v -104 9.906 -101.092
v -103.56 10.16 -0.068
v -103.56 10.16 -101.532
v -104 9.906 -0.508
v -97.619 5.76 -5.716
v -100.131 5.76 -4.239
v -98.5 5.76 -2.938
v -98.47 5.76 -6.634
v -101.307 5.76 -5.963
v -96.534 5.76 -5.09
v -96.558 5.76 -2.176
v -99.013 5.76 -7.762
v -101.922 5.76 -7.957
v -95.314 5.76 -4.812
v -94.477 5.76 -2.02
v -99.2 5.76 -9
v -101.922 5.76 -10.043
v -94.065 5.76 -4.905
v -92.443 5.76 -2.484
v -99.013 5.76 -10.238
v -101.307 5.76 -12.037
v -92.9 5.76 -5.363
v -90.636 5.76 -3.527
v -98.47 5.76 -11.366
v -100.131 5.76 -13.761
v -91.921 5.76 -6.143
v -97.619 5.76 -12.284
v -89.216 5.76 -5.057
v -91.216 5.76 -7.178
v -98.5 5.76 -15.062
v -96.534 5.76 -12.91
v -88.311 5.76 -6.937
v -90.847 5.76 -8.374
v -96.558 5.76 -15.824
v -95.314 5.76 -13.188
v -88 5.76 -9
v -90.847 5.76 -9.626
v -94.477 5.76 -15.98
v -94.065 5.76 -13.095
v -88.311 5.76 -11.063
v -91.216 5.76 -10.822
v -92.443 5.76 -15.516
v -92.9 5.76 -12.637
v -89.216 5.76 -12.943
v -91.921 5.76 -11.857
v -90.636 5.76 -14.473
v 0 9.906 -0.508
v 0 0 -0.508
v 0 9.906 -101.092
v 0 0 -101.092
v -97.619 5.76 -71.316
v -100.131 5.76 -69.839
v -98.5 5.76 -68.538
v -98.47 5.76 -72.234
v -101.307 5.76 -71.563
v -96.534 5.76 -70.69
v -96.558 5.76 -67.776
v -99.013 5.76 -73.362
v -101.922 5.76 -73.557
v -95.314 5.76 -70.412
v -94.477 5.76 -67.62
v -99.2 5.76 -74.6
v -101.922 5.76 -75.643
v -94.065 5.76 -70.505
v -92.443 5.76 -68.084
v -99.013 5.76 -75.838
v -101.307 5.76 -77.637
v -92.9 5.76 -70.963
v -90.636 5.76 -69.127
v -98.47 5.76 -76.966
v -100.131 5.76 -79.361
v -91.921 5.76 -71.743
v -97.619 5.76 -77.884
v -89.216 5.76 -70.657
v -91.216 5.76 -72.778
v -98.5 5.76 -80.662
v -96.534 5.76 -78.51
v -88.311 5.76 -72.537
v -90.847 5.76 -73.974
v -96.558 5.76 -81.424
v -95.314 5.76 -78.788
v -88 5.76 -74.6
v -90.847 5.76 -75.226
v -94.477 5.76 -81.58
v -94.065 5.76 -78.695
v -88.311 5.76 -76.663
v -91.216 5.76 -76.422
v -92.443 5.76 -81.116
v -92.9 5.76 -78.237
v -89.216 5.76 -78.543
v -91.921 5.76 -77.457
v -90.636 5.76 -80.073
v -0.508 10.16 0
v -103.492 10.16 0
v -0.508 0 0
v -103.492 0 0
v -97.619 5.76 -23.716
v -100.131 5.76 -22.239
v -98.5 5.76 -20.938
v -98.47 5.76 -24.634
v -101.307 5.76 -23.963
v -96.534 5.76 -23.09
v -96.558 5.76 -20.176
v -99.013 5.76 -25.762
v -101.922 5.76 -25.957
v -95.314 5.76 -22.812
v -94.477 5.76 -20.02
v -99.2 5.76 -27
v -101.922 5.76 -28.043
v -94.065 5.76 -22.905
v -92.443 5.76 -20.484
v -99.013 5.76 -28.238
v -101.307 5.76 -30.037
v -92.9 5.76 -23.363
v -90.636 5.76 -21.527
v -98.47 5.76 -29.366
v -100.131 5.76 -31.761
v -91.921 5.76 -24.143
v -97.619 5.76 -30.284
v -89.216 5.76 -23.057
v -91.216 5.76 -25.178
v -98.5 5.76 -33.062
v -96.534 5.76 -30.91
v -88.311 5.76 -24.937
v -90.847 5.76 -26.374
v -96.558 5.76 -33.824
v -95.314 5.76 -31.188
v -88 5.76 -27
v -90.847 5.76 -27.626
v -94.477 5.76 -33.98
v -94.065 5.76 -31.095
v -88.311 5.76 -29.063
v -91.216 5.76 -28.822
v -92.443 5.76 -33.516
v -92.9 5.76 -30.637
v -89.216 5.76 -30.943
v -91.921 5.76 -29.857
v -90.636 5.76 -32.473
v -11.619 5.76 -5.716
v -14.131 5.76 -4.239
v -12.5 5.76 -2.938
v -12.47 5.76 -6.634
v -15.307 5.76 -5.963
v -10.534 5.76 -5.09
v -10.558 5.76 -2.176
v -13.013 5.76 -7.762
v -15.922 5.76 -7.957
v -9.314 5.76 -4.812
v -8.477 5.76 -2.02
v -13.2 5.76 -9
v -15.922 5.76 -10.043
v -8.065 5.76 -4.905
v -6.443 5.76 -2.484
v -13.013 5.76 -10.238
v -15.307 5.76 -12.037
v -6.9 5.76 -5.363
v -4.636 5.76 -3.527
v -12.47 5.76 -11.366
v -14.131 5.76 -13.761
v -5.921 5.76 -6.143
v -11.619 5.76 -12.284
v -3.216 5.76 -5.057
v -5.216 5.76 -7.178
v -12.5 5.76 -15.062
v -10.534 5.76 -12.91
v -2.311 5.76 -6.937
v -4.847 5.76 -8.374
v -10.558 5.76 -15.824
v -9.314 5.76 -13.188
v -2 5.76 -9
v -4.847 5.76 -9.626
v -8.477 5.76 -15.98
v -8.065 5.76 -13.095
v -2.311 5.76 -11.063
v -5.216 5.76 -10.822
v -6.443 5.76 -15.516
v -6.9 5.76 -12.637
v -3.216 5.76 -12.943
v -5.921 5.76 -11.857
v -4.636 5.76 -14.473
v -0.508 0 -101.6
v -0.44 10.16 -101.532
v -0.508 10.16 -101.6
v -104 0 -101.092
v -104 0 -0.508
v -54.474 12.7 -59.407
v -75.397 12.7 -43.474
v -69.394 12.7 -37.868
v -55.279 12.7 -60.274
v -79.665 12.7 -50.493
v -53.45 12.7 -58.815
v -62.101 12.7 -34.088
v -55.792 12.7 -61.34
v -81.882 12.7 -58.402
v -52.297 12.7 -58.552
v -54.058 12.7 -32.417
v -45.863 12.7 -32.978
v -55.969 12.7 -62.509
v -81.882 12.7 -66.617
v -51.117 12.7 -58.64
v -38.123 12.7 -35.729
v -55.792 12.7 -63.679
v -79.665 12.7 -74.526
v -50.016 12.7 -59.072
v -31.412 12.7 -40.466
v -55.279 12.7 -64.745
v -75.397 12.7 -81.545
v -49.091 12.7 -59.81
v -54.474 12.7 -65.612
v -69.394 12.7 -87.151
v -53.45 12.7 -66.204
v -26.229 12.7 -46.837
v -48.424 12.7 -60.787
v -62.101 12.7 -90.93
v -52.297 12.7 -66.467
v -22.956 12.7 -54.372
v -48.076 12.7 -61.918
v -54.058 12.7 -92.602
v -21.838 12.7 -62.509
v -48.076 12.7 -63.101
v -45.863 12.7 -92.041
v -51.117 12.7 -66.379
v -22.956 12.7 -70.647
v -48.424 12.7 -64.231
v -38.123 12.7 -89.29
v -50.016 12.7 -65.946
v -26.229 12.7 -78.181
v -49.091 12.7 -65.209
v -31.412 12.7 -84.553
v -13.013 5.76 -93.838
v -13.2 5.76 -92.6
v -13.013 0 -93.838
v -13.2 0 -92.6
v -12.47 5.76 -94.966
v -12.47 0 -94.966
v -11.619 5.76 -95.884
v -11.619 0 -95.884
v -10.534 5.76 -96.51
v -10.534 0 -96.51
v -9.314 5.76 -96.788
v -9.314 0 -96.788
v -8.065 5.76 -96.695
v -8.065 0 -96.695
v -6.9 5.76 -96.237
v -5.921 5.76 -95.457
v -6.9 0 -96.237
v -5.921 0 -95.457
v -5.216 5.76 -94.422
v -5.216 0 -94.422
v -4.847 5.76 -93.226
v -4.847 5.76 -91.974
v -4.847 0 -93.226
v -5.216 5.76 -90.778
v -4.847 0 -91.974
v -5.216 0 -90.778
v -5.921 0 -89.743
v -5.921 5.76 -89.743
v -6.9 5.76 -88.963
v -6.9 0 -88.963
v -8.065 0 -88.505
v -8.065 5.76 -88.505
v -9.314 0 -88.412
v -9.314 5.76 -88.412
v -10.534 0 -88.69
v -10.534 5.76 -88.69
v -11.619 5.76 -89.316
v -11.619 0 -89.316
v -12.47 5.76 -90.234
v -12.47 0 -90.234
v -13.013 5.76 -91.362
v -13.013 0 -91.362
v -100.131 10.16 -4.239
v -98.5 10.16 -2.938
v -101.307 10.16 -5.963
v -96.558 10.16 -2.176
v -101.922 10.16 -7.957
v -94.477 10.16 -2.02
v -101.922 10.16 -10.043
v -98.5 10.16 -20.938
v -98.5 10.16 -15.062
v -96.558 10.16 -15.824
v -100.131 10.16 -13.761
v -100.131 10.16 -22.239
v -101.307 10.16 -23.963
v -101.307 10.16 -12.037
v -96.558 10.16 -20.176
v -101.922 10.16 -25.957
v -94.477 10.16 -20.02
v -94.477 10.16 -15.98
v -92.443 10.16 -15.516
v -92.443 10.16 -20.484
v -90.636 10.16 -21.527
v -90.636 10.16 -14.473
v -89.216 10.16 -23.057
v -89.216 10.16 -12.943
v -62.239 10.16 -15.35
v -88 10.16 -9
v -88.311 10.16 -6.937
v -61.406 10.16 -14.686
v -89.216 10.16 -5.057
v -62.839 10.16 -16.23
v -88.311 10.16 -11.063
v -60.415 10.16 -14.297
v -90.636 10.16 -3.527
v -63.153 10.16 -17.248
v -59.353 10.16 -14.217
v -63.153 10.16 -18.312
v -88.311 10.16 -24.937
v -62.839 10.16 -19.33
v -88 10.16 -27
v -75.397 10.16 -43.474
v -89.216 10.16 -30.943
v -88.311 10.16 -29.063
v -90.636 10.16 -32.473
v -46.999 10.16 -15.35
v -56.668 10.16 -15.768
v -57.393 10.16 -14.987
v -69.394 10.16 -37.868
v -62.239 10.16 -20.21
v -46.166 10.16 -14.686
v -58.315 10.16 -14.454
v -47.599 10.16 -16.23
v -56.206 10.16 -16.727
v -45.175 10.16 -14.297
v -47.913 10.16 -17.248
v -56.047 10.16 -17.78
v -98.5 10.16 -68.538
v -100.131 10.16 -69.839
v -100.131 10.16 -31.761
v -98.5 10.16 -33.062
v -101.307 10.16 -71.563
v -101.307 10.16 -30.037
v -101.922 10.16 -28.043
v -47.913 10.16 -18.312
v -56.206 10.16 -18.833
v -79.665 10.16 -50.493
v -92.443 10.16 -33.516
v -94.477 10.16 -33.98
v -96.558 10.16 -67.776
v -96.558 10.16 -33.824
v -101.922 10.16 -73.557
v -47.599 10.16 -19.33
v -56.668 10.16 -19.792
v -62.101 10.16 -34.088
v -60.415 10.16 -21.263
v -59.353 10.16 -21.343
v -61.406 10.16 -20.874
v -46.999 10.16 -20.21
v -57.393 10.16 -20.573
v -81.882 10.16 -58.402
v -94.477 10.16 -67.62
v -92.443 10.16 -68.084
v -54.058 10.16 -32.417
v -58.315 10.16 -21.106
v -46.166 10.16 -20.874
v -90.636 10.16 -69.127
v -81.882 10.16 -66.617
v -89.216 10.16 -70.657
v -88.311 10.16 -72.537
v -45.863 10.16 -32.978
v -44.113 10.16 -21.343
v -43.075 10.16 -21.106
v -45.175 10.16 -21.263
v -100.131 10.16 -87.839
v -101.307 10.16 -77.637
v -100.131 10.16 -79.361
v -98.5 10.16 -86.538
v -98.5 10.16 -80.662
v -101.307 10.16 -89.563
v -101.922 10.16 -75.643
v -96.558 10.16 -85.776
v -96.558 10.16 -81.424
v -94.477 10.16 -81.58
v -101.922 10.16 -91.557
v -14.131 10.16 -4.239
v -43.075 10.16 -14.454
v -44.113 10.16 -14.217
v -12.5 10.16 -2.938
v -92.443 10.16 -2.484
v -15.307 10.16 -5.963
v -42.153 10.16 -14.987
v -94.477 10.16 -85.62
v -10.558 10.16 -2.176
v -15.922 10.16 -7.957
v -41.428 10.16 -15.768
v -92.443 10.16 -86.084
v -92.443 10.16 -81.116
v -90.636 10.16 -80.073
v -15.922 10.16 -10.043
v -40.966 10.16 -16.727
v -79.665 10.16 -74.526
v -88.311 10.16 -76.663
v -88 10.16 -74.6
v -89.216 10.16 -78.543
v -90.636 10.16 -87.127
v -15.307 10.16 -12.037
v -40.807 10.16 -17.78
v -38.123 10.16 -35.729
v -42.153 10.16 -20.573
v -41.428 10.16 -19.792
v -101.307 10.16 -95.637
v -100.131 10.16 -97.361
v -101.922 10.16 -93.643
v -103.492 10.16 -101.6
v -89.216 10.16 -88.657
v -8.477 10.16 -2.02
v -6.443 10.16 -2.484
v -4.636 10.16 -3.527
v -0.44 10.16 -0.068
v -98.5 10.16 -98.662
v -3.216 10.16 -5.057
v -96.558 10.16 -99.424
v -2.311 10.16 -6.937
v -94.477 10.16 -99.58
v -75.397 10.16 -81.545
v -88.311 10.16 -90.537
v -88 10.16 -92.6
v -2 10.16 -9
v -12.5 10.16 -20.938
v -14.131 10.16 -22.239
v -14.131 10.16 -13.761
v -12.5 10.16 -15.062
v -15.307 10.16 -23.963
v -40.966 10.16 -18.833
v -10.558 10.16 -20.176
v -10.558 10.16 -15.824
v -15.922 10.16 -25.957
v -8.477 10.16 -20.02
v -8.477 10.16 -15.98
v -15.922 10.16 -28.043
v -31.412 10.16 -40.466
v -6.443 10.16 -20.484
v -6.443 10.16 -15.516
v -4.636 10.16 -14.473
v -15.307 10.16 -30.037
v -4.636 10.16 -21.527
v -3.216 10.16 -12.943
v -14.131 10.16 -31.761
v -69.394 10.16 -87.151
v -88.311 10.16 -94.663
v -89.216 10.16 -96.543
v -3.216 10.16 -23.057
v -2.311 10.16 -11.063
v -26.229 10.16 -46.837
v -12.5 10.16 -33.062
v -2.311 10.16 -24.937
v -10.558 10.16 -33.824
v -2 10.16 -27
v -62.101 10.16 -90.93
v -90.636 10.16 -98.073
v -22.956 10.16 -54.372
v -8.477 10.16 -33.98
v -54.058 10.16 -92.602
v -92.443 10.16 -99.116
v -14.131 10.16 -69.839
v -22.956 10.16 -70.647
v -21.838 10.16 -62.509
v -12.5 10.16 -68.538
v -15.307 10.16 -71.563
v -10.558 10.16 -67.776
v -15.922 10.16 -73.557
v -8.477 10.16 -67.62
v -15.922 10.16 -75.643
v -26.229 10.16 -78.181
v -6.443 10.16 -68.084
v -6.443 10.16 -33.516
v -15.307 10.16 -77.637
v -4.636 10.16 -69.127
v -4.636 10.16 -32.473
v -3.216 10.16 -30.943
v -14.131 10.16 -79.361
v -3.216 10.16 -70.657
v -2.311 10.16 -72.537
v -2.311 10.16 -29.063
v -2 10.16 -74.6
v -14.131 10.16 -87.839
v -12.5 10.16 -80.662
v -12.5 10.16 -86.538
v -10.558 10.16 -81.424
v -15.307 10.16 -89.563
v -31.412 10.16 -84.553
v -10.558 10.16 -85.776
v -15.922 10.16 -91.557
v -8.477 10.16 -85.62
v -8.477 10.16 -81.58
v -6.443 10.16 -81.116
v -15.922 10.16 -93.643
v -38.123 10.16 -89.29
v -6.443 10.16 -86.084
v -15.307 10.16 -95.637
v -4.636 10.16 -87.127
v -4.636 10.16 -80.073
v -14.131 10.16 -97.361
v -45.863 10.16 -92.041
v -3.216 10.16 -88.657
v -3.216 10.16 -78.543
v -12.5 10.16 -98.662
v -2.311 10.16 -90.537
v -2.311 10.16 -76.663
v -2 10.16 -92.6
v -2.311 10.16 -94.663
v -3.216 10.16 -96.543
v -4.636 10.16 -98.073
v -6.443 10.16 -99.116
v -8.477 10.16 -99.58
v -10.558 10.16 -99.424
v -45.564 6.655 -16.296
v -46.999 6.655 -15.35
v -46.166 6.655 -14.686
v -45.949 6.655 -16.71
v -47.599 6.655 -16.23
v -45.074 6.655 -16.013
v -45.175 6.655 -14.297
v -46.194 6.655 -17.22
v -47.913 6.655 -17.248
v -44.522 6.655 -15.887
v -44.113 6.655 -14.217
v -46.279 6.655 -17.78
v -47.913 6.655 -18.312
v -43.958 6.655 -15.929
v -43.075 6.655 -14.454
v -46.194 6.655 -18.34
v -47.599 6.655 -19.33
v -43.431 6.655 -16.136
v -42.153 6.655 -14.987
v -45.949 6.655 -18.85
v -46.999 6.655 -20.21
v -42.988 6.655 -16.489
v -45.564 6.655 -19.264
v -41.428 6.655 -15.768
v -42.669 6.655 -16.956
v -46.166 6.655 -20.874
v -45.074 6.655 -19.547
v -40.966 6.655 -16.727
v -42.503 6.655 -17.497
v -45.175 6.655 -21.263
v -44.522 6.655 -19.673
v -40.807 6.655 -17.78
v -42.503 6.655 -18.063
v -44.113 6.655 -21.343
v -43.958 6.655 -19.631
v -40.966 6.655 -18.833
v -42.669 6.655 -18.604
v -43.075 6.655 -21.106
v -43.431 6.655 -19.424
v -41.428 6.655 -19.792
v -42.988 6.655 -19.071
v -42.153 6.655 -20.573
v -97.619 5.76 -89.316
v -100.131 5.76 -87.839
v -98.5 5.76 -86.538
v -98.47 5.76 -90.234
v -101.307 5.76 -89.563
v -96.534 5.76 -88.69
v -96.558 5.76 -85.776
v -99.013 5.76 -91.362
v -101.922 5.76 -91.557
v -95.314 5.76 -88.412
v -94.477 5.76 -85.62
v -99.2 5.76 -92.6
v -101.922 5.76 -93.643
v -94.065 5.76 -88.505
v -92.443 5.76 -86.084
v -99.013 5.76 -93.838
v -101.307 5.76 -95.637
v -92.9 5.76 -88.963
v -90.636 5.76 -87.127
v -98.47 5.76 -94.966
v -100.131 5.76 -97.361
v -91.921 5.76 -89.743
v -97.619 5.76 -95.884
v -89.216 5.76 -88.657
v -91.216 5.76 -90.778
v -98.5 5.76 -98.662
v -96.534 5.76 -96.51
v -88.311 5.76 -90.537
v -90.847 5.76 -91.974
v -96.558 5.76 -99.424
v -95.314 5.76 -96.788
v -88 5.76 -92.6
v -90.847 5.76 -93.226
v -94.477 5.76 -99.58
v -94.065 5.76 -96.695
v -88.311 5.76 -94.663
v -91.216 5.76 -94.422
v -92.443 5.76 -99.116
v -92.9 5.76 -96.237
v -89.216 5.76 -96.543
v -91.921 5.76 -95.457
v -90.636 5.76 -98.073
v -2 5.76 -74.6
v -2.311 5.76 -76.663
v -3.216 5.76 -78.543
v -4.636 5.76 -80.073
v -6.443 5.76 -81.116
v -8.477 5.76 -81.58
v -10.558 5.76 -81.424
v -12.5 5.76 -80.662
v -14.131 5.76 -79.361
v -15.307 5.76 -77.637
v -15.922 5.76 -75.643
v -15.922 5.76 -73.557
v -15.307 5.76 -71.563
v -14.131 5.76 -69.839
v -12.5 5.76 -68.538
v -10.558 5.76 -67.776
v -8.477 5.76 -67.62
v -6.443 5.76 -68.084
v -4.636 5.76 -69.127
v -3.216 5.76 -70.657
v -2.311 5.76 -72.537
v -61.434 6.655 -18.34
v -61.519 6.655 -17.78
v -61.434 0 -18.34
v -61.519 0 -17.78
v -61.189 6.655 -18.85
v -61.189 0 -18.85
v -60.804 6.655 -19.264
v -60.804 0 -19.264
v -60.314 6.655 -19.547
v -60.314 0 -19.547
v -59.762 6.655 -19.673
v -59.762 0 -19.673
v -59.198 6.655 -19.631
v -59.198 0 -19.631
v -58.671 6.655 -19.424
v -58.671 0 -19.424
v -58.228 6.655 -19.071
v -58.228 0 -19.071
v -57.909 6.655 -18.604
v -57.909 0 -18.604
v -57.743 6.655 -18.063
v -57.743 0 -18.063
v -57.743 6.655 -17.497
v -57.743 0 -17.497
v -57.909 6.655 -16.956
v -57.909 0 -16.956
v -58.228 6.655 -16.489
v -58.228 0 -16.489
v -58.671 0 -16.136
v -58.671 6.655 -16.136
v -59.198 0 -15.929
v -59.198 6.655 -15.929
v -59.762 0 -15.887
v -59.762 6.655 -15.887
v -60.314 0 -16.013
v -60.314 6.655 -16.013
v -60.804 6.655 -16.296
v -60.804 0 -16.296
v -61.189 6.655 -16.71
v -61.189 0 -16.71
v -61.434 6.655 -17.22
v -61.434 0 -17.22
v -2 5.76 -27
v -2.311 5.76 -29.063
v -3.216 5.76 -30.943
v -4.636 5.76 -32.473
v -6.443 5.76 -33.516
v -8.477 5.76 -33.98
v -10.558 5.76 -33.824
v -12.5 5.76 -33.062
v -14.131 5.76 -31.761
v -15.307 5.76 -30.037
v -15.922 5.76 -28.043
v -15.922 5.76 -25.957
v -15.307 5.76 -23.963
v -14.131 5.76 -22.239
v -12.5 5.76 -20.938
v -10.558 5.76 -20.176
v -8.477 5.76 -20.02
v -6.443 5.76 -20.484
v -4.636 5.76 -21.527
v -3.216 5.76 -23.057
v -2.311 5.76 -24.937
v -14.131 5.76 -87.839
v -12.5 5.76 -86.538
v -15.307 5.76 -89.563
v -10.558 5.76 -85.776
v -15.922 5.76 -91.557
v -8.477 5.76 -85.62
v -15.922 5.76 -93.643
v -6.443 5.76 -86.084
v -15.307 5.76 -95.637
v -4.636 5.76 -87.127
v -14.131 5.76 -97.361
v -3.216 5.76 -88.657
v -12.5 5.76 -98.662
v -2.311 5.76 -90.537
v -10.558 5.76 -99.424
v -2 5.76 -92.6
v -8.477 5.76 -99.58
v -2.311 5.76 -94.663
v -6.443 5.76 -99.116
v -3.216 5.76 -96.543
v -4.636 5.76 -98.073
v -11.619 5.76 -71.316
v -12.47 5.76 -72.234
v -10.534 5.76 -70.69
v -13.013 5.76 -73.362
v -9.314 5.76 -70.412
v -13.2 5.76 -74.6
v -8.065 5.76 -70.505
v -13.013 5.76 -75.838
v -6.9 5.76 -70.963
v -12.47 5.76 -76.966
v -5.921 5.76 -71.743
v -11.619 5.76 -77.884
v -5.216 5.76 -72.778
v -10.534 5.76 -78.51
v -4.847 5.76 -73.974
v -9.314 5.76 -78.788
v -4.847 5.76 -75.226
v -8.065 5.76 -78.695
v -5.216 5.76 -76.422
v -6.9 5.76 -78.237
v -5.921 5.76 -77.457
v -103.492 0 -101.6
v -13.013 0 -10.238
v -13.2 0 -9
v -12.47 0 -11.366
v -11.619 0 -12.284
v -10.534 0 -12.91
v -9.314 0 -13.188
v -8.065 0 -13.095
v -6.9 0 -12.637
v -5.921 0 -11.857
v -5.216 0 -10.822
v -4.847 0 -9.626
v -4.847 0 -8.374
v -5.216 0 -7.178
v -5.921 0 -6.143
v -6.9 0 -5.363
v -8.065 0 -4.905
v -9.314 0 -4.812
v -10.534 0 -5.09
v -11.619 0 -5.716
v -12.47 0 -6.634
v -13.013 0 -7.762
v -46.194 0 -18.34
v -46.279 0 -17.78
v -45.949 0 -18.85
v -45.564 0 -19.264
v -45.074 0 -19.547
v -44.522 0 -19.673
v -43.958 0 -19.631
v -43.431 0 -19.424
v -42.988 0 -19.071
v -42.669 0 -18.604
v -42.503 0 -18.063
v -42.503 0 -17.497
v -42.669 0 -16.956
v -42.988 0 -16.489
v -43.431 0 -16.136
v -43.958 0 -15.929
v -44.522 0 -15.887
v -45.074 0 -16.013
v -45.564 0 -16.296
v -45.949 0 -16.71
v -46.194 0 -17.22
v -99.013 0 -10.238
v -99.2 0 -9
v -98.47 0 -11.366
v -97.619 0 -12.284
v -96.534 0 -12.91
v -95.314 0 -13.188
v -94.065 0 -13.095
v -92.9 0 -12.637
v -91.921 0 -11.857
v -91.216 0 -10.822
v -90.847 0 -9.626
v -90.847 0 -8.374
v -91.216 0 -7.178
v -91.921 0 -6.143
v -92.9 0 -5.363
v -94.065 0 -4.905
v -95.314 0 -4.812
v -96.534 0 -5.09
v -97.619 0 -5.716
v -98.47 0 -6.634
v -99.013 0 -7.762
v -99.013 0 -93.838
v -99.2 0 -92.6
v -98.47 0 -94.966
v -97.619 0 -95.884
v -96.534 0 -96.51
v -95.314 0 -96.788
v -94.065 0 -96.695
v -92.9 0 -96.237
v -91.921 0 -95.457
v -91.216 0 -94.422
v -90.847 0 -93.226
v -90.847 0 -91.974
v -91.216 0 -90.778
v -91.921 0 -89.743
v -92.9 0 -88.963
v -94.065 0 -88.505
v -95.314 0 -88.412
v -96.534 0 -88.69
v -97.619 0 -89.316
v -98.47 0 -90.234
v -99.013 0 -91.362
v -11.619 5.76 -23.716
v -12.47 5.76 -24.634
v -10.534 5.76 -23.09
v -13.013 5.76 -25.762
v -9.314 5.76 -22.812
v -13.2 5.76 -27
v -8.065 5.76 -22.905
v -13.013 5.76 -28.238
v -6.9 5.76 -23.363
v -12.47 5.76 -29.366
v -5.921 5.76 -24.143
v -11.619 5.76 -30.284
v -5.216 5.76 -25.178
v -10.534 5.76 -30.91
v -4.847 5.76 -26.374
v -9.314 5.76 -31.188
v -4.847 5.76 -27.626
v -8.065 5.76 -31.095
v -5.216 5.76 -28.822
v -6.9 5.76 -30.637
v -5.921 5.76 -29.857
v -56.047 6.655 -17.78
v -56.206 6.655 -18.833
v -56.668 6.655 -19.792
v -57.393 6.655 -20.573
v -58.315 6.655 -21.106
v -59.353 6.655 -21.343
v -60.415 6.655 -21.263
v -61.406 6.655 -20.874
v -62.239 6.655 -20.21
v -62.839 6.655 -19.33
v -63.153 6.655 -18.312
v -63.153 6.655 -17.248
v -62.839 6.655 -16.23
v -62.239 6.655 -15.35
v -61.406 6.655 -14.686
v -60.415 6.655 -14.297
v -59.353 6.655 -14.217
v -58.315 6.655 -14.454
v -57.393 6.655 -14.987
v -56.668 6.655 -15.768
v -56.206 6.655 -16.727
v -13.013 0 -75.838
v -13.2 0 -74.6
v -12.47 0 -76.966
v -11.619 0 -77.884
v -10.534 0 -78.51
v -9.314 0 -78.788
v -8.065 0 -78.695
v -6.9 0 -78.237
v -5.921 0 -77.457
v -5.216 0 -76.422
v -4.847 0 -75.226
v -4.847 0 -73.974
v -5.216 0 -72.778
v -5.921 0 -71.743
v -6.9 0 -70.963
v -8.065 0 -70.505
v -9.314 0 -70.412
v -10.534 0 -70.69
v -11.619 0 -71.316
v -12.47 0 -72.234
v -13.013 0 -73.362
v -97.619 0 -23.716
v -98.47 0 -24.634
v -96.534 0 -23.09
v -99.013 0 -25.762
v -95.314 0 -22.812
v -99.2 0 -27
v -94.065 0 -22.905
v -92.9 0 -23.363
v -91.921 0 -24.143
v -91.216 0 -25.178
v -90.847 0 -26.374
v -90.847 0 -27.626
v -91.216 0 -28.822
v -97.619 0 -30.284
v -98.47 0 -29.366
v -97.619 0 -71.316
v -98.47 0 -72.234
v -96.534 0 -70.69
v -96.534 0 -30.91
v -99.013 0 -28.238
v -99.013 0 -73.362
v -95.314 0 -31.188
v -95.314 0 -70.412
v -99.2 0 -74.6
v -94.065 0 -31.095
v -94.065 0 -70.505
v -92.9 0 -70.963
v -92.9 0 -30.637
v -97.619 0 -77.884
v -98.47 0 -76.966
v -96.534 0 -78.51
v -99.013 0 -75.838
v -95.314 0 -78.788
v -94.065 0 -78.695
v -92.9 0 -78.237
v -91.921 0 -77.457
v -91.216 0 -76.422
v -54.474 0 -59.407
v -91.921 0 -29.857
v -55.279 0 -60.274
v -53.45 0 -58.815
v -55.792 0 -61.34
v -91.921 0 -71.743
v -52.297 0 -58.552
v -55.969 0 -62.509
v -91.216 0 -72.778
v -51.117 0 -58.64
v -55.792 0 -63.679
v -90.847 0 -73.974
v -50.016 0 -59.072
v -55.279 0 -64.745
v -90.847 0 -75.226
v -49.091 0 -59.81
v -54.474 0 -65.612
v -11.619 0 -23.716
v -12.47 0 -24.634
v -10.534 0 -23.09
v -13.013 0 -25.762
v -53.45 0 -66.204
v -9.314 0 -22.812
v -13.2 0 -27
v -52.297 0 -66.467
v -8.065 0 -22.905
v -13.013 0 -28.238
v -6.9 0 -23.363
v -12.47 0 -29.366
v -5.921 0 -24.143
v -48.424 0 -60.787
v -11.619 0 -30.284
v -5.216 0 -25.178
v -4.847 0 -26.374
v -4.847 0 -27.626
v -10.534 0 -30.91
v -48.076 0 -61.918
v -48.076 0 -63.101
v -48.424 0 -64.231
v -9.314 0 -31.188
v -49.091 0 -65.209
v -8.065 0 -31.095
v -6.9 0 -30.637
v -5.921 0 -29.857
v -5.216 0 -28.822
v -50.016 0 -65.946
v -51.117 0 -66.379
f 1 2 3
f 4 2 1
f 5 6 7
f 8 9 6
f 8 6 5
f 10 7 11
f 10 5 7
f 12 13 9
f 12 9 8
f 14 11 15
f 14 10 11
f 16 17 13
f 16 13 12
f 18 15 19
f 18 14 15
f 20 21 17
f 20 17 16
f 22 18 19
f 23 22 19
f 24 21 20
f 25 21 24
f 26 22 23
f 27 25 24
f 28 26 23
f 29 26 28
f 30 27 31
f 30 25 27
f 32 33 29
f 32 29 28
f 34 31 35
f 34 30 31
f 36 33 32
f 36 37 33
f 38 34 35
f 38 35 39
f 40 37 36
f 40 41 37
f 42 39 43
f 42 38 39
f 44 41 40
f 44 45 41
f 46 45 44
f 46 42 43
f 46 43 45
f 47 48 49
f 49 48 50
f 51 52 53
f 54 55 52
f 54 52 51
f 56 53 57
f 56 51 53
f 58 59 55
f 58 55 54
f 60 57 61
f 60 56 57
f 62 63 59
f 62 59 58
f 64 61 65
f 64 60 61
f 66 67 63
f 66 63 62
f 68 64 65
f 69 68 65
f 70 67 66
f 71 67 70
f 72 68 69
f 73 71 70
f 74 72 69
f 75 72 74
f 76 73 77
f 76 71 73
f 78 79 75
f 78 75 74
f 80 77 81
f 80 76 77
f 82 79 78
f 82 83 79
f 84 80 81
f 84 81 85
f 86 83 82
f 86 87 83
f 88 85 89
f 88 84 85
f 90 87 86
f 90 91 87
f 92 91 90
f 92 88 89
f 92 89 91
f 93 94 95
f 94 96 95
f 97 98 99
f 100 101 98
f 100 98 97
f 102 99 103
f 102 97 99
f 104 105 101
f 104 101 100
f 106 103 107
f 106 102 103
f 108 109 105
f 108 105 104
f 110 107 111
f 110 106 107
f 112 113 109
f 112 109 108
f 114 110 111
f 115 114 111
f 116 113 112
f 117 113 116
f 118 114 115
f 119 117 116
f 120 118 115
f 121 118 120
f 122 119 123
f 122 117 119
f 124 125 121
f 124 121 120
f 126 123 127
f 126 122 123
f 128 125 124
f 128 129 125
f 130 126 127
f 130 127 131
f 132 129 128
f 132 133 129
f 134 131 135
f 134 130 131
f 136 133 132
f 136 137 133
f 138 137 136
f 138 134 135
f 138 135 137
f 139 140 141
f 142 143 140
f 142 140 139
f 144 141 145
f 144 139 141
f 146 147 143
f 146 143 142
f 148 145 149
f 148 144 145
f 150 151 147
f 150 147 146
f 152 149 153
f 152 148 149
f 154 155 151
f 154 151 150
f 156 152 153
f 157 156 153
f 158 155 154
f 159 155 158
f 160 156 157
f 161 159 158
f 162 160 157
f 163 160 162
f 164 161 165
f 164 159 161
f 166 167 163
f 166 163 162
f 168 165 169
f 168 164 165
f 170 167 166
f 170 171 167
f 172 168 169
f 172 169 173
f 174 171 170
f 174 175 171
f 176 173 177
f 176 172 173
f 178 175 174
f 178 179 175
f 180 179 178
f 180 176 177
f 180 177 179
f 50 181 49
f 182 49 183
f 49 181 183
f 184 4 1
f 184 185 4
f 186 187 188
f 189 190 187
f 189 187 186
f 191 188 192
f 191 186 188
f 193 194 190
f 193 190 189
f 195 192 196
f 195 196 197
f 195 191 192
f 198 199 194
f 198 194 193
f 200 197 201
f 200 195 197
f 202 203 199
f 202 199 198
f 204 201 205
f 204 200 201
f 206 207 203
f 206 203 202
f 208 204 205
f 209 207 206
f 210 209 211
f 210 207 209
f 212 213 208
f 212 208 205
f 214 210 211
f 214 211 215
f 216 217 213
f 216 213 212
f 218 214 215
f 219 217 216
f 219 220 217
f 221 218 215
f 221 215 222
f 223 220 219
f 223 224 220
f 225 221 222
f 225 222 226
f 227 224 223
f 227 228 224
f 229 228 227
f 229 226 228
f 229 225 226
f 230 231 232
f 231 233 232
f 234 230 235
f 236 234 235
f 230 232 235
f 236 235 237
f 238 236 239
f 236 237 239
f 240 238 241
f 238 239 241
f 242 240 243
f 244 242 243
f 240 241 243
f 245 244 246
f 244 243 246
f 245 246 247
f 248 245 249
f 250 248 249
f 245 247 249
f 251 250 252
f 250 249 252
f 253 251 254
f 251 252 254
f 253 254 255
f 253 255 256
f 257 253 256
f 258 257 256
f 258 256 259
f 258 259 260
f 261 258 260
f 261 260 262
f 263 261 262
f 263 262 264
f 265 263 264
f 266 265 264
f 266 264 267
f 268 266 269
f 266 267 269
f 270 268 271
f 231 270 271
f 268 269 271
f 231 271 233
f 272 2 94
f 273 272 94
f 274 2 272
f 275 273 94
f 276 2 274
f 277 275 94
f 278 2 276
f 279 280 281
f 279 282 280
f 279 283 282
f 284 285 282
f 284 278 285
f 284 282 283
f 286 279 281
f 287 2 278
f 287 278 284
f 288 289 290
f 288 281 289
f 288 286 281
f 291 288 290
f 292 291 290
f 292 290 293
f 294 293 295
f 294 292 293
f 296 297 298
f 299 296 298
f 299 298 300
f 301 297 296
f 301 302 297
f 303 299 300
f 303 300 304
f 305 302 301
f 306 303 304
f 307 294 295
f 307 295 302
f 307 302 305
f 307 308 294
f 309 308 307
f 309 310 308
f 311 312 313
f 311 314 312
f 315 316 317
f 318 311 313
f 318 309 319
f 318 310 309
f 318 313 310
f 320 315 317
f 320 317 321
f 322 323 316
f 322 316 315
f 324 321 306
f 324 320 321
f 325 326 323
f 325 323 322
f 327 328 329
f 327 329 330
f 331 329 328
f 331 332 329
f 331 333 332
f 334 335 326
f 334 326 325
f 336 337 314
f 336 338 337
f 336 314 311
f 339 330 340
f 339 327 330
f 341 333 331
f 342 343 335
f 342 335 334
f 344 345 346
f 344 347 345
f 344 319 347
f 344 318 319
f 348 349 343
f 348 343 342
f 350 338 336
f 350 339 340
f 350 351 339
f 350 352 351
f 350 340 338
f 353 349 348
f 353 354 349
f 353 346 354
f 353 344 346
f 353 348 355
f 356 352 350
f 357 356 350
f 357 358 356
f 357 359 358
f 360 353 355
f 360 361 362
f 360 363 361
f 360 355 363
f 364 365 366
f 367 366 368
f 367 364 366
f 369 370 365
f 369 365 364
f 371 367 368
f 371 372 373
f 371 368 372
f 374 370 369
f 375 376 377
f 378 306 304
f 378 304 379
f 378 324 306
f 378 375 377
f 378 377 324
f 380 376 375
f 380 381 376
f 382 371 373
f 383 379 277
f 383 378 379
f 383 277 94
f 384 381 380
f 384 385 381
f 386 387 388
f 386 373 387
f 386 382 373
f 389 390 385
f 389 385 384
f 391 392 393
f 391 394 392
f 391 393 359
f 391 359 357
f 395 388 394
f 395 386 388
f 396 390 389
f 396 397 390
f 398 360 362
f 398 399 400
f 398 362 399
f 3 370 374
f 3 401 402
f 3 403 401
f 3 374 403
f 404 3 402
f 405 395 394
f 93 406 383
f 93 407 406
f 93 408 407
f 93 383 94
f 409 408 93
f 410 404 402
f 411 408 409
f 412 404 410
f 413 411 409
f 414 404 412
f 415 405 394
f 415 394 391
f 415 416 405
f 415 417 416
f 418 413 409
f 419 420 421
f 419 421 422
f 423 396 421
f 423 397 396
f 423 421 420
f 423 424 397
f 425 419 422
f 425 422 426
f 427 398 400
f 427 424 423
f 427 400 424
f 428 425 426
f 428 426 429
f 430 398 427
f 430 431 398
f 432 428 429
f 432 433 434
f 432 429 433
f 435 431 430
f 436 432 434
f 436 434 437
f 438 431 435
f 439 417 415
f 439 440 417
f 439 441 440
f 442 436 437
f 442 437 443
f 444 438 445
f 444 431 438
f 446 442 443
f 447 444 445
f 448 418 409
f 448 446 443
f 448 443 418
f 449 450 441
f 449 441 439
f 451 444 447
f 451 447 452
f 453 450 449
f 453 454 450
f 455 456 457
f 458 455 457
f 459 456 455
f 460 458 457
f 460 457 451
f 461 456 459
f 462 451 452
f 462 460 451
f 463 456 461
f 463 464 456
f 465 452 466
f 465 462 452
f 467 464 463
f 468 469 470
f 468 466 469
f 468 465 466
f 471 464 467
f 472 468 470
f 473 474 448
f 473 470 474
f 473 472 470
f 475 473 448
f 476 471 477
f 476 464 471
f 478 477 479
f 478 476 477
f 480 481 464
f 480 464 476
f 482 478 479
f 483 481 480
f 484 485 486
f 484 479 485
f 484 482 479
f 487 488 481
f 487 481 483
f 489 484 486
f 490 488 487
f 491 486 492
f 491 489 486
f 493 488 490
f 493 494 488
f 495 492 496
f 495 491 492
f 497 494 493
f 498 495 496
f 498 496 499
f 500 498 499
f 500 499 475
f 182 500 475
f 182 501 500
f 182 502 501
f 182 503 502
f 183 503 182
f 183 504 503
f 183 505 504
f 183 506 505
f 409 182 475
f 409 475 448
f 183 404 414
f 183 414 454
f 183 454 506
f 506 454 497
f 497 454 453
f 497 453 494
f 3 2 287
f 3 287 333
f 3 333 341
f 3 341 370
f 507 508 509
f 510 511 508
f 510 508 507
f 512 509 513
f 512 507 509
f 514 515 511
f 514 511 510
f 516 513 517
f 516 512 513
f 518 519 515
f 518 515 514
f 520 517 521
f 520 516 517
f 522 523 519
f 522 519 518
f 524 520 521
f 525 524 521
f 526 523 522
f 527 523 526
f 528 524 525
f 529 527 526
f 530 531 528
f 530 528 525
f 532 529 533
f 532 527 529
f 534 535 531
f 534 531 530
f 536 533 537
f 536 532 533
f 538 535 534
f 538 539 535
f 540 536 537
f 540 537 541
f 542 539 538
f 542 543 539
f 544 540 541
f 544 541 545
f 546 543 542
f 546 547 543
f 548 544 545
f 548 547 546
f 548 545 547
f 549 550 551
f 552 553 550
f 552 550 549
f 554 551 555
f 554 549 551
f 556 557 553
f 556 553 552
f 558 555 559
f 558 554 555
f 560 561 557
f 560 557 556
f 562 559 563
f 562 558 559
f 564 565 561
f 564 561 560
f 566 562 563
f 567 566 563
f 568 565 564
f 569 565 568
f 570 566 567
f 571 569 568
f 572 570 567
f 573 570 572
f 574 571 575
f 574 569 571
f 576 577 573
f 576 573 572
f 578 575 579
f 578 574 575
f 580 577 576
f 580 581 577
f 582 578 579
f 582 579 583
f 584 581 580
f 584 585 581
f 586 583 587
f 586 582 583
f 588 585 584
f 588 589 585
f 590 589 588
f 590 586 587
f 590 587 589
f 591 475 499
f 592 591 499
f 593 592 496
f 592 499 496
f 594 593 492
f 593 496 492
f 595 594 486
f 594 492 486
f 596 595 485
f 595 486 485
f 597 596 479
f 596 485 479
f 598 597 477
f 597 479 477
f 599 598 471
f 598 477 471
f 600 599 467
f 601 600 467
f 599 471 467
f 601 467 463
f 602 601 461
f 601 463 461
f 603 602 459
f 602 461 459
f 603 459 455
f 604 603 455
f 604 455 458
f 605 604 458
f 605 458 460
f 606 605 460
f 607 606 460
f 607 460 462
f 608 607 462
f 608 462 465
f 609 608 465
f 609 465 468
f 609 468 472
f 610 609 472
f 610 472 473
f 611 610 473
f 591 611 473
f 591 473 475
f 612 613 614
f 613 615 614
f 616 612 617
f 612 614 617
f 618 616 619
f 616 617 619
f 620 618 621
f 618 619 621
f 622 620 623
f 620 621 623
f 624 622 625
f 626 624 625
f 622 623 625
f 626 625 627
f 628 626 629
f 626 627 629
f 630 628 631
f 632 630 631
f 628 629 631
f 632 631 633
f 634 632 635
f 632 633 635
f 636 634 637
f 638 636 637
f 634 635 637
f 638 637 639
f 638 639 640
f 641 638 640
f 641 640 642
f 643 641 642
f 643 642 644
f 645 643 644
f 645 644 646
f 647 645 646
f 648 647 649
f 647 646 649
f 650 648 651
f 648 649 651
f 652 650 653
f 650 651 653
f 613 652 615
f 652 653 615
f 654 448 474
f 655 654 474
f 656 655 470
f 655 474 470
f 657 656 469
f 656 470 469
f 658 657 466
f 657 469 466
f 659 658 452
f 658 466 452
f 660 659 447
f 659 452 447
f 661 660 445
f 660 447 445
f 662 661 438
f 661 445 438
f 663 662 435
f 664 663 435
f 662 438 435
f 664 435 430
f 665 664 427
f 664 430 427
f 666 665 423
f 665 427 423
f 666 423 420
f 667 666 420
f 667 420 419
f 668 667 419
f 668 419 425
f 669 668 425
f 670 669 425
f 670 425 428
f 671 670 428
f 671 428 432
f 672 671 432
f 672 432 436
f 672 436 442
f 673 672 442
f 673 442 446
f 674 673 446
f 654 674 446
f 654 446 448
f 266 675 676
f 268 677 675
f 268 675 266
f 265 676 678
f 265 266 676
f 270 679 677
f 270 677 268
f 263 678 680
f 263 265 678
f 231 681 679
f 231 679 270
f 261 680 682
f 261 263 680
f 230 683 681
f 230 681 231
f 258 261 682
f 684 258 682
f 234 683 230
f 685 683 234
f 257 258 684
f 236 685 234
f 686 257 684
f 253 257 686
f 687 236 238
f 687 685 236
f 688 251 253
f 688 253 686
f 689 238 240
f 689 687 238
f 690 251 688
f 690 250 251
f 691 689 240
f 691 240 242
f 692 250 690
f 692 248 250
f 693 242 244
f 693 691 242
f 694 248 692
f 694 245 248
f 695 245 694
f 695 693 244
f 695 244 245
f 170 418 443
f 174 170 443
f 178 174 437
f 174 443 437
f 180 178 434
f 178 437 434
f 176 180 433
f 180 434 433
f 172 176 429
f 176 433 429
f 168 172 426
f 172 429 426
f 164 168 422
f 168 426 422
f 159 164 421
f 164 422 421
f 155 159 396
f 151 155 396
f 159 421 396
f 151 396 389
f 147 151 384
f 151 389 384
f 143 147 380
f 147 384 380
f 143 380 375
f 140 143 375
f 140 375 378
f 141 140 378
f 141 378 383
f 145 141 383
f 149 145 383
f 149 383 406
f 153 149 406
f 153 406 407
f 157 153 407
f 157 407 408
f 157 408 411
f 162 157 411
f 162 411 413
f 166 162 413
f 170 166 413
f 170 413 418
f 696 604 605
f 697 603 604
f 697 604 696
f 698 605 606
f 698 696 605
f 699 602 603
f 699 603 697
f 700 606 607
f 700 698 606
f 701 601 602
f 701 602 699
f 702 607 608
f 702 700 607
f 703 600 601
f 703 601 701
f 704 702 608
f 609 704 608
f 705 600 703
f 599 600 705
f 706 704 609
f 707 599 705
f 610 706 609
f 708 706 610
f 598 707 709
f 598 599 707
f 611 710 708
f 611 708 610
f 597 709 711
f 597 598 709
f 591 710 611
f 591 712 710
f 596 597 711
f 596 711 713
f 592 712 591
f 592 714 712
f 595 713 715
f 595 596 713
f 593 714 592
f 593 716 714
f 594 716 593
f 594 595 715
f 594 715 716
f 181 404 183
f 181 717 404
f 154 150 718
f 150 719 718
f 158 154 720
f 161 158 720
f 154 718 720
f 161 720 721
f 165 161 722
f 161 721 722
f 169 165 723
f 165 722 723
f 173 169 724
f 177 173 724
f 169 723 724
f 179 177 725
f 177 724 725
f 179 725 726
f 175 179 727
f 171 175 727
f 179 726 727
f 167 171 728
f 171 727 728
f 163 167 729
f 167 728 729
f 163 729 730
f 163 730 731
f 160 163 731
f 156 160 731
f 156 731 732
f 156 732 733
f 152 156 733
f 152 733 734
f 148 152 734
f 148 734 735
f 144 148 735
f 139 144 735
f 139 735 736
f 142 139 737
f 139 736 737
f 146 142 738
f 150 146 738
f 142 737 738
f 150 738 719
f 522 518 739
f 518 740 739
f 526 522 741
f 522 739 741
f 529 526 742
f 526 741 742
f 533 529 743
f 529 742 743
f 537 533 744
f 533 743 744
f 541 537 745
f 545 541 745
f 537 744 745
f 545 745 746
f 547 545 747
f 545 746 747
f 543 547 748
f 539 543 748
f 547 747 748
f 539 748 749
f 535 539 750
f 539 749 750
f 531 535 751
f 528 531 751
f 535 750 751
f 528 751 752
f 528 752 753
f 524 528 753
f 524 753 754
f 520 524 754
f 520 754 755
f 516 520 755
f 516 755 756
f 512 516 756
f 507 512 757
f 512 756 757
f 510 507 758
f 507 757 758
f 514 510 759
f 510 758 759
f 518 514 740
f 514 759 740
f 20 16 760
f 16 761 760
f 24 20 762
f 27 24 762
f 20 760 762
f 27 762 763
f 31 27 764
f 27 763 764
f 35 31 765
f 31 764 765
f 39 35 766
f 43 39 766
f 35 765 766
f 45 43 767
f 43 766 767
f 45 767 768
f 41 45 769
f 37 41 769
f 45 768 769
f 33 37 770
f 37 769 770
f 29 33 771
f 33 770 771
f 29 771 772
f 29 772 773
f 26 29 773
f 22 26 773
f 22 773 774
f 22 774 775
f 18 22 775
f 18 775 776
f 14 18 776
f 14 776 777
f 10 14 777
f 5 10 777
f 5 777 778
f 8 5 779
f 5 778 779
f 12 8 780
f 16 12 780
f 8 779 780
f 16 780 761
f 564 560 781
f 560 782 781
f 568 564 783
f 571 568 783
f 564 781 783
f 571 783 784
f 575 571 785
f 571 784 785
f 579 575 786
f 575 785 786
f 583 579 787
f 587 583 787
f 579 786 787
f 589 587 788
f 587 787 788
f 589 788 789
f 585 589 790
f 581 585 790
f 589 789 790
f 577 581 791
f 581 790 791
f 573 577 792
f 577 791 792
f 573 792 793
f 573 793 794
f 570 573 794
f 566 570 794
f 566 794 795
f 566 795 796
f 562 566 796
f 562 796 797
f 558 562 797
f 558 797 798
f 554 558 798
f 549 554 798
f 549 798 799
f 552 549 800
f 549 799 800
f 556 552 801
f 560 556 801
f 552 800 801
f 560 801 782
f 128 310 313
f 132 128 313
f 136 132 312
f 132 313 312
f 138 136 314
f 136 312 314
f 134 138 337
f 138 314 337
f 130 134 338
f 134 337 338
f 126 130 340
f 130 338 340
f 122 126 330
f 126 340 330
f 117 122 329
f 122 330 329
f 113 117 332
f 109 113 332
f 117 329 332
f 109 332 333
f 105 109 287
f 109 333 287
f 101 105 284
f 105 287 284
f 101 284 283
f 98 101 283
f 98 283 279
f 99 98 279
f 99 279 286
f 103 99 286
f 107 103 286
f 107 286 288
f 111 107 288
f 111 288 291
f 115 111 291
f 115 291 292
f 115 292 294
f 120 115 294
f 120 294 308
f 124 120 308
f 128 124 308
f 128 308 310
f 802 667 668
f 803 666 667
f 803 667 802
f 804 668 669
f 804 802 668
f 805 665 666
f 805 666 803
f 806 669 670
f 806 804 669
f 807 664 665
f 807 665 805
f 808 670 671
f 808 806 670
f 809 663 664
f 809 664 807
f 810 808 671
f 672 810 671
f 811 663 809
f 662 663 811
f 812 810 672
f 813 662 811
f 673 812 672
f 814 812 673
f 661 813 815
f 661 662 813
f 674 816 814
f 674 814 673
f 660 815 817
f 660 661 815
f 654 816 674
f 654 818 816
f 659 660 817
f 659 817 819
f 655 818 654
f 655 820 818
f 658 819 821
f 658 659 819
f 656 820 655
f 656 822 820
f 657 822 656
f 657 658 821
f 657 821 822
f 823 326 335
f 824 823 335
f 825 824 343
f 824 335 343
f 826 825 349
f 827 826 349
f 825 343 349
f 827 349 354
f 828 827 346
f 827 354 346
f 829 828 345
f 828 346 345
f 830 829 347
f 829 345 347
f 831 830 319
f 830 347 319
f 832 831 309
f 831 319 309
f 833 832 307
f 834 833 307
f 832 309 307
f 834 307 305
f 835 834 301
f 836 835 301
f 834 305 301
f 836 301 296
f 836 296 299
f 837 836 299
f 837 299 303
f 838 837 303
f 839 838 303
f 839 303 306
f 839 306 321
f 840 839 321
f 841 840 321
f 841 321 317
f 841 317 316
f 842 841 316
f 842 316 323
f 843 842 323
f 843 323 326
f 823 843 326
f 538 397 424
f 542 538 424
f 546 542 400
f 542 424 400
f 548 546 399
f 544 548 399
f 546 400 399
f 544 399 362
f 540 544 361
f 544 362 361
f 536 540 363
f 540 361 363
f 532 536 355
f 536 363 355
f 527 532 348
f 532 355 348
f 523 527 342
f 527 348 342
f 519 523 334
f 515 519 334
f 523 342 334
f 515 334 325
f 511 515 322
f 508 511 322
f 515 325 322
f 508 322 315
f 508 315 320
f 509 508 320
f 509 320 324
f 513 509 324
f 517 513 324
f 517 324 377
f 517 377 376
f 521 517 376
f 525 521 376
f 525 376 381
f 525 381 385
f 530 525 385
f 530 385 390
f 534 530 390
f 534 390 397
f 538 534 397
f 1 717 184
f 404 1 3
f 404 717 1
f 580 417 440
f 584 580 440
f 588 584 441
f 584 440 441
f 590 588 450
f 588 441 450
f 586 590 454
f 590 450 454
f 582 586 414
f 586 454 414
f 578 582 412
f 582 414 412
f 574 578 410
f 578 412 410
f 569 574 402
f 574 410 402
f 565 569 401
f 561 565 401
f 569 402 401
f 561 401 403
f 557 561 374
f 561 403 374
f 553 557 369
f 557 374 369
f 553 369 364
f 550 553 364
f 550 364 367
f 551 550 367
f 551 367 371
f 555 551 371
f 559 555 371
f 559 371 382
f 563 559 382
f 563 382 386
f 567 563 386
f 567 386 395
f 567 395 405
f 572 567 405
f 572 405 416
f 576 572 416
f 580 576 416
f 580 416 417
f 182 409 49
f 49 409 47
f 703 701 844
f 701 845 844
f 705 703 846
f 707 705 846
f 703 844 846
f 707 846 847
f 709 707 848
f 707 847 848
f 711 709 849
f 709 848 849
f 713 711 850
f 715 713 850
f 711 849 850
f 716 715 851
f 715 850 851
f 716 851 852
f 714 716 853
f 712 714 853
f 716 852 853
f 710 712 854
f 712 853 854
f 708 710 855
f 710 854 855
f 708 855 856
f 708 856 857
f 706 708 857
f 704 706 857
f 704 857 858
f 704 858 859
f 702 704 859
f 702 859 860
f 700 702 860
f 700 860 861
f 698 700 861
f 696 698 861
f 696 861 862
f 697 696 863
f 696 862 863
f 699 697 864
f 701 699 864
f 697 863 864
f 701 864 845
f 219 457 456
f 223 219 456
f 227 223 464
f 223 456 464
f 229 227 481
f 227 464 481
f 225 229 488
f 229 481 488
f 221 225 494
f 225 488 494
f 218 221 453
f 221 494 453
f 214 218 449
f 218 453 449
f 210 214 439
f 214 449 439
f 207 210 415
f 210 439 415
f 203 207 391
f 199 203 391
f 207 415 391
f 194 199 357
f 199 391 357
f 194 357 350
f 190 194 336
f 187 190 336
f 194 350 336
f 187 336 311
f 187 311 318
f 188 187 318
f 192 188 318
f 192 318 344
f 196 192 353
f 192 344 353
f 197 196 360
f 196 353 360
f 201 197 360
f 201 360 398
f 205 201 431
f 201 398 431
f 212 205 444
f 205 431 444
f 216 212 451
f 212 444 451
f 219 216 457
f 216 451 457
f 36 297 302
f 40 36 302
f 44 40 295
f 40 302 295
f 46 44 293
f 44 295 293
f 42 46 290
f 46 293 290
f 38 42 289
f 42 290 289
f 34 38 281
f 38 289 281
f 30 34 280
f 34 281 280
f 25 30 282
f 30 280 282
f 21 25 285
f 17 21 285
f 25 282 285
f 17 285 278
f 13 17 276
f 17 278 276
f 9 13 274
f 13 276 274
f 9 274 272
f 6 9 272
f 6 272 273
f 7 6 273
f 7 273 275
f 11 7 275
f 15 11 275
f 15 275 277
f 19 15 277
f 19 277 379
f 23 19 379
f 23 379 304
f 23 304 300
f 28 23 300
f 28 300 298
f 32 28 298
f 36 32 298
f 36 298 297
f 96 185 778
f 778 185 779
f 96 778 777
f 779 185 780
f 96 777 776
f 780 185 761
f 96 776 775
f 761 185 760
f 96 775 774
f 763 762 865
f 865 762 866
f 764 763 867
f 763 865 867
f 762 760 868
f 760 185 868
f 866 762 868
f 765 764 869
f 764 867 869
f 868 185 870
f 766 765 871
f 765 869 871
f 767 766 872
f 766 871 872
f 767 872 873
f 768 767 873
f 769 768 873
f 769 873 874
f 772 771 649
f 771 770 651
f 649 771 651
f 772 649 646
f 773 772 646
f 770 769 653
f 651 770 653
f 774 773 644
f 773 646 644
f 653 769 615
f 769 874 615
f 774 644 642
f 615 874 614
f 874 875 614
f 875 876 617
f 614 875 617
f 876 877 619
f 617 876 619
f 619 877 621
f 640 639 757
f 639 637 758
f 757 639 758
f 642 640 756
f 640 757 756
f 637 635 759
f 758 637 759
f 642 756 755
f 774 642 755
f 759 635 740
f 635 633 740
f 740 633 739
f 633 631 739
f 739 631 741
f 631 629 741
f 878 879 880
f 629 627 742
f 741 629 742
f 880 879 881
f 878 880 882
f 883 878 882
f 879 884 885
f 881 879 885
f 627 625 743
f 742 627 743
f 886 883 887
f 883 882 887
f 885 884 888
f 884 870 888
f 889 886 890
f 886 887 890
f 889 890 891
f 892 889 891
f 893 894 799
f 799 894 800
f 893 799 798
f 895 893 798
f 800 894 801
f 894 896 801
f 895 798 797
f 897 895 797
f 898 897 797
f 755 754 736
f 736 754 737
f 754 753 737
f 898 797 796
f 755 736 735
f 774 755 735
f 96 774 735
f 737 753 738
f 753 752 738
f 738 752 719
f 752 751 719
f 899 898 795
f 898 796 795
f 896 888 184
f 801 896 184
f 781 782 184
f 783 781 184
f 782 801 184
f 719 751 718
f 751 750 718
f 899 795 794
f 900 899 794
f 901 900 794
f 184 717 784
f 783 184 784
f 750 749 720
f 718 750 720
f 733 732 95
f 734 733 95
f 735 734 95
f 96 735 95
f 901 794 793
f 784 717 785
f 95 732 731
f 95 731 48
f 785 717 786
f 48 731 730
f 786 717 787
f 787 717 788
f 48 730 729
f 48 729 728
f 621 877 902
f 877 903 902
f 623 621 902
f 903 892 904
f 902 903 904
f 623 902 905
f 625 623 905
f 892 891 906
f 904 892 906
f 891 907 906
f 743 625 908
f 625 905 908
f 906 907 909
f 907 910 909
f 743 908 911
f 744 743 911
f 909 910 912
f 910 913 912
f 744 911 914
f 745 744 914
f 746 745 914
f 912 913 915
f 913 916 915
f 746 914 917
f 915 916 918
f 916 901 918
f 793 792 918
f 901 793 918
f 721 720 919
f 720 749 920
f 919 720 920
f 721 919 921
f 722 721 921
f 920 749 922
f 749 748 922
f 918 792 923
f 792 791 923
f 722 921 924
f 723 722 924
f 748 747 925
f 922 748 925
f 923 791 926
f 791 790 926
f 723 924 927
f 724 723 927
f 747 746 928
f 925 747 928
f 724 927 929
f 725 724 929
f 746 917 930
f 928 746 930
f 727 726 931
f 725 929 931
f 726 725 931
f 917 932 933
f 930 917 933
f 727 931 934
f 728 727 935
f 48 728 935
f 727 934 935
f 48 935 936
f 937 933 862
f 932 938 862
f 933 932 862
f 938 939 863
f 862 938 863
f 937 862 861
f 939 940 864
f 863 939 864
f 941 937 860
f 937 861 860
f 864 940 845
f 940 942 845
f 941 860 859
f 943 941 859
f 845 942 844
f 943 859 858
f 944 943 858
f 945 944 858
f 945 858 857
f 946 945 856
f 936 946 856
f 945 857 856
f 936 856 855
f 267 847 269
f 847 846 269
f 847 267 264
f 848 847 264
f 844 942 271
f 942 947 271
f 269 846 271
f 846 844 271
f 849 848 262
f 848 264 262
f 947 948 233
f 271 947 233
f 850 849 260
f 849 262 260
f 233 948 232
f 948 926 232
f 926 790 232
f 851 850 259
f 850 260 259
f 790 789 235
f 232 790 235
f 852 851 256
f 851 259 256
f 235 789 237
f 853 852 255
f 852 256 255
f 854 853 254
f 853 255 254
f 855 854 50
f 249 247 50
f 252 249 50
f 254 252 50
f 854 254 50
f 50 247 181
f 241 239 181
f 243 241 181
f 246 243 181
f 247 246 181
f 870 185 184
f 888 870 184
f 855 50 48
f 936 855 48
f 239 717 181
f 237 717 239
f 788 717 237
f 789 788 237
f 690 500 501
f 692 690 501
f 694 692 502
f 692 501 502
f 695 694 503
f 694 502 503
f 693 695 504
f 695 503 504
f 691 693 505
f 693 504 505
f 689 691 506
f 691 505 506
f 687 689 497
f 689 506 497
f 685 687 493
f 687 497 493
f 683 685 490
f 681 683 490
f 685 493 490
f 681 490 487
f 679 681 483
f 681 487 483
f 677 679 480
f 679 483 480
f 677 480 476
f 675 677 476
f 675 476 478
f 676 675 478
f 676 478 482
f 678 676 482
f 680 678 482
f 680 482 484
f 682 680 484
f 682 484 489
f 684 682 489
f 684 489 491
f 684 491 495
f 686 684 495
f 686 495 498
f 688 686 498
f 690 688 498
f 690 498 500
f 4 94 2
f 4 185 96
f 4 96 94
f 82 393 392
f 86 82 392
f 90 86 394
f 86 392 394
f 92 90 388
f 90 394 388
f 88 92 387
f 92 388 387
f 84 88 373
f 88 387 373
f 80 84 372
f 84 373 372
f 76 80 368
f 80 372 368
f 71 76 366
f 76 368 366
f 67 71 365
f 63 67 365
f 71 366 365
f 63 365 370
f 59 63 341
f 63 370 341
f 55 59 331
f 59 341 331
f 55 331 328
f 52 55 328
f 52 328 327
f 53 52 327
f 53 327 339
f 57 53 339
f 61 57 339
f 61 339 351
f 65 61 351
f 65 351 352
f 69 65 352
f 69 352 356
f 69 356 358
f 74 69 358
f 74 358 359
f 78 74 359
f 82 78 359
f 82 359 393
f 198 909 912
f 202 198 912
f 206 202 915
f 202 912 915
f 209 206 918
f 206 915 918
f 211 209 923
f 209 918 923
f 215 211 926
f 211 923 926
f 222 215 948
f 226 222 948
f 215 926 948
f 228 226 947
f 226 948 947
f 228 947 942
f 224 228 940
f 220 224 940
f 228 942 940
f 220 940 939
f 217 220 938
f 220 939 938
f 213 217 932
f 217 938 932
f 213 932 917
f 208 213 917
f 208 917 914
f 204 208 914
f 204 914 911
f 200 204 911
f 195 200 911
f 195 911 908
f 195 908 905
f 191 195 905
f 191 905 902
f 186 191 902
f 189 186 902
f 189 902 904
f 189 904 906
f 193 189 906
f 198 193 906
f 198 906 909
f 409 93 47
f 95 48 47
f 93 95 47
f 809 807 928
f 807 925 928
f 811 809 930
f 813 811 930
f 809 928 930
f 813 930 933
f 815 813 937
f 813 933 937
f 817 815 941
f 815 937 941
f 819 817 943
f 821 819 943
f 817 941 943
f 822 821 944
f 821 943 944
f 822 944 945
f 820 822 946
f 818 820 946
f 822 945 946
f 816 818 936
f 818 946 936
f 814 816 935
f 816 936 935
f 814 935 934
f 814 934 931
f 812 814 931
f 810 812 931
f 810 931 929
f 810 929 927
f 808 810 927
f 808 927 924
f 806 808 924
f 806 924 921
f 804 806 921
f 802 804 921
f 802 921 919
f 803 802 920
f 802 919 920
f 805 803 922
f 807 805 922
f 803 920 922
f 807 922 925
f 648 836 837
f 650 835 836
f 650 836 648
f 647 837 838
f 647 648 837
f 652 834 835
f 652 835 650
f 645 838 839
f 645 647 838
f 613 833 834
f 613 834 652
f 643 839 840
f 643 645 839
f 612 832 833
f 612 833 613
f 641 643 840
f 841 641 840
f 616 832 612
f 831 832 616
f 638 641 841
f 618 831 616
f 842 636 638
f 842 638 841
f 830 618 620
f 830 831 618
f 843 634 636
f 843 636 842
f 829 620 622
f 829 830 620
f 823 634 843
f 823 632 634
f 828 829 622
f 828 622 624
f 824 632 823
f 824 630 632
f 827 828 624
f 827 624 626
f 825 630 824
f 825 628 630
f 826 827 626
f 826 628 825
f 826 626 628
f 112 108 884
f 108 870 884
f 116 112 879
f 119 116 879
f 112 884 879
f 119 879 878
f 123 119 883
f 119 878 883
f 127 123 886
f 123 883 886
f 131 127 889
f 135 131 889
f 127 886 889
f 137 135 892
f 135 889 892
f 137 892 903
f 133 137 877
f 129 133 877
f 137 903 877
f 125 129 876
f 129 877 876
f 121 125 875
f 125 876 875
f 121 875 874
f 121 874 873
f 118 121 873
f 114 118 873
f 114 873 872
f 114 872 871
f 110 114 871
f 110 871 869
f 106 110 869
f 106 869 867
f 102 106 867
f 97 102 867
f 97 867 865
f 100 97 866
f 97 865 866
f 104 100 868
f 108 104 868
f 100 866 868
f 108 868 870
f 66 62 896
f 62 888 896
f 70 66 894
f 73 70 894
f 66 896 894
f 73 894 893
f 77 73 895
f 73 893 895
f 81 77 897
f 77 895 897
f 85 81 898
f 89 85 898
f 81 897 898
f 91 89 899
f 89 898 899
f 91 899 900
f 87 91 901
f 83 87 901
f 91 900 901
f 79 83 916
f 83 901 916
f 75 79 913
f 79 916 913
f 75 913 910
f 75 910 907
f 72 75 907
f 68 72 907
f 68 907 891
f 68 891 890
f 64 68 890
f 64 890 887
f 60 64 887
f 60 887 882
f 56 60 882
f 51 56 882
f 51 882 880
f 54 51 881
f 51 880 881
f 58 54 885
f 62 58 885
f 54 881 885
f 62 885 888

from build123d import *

# Parameters (mm, degrees)
SKETCH1_W                                      = 104.000000026
SKETCH1_H                                      = 101.6
BOSS_EXTRUDE1_DEPTH                            = 10.16
SKETCH5_R                                      = 30.1625
BOSS_EXTRUDE2_DEPTH                            = 2.54
CBORE_FOR_6_SOCKET_HEAD_CAP_SCREW1_D           = 3.7973
CBORE_FOR_6_SOCKET_HEAD_CAP_SCREW1_CBORE_D     = 7.14502
CBORE_FOR_6_SOCKET_HEAD_CAP_SCREW1_CBORE_DEPTH = 3.5052
F_3_8_16_TAPPED_HOLE1_D                        = 7.9375
CBORE_FOR_M8_SBHCS1_D                          = 8.4
CBORE_FOR_M8_SBHCS1_CBORE_D                    = 14
CBORE_FOR_M8_SBHCS1_CBORE_DEPTH                = 4.4
CHAMFER1_SIZE                                  = 0.254
CHAMFER1_SIZE2                                 = 0.439940905
CHAMFER1_PART_2_SIZE                           = 0.254
CHAMFER1_PART_2_SIZE2                          = 0.439940905
CHAMFER2_SIZE                                  = 0.508


with BuildPart() as part:
    # Sketch1 → Boss-Extrude1 (new body)
    with BuildSketch(Plane(origin=(0, 0, 0), x_dir=(1, 0, 0), z_dir=(0, 1, 0))):
        with Locations((-52.000000013, 50.8)):
            Rectangle(SKETCH1_W, SKETCH1_H)
    extrude(amount=BOSS_EXTRUDE1_DEPTH)

    # Sketch5 → Boss-Extrude2 (add)
    with BuildSketch(Plane(origin=(0, 10.16, 0), x_dir=(1, 0, 0), z_dir=(0, 1, 0))):
        with Locations((-52.000000013, 62.5094)):
            Circle(SKETCH5_R)
    extrude(amount=BOSS_EXTRUDE2_DEPTH)

    # CBORE for #6 Socket Head Cap Screw1 (through all)
    with Locations(Plane(origin=(0, 10.16, 0), x_dir=(1, 0, 0), z_dir=(0, 1, 0))):
        with Locations((-44.380000013, 17.78), (-59.620000013, 17.78)):
            CounterBoreHole(CBORE_FOR_6_SOCKET_HEAD_CAP_SCREW1_D / 2, CBORE_FOR_6_SOCKET_HEAD_CAP_SCREW1_CBORE_D / 2, CBORE_FOR_6_SOCKET_HEAD_CAP_SCREW1_CBORE_DEPTH)

    # 3/8-16 Tapped Hole1 (through all)
    with Locations(Plane(origin=(0, 12.7, 0), x_dir=(1, 0, 0), z_dir=(0, 1, 0))):
        with Locations((-52.000000013, 62.5094)):
            Hole(F_3_8_16_TAPPED_HOLE1_D / 2)

    # CBORE for M8 SBHCS1 (through all)
    with Locations(Plane(origin=(0, 10.16, 0), x_dir=(1, 0, 0), z_dir=(0, 1, 0))):
        with Locations((-8.999999961, 92.6), (-8.999999961, 74.6), (-8.999999961, 27), (-8.999999961, 9), (-95.000000013, 9), (-95.000000013, 27), (-95.000000013, 74.6), (-95.000000013, 92.6)):
            CounterBoreHole(CBORE_FOR_M8_SBHCS1_D / 2, CBORE_FOR_M8_SBHCS1_CBORE_D / 2, CBORE_FOR_M8_SBHCS1_CBORE_DEPTH)

    # Chamfer1
    chamfer1_edges = [part.edges().sort_by_distance(p)[0] for p in [
        (0, 10.16, -50.8),
    ]]
    chamfer1_side = [part.faces().sort_by_distance(p)[0] for p in [
        (0, 5.08, -50.8),
    ]]
    chamfer(chamfer1_edges, length=CHAMFER1_SIZE, length2=CHAMFER1_SIZE2, reference=chamfer1_side[0])

    # Chamfer1 part 2
    chamfer1_part_2_edges = [part.edges().sort_by_distance(p)[0] for p in [
        (-104.000000026, 10.16, -50.8),
    ]]
    chamfer1_part_2_side = [part.faces().sort_by_distance(p)[0] for p in [
        (-104.000000026, 5.08, -50.8),
    ]]
    chamfer(chamfer1_part_2_edges, length=CHAMFER1_PART_2_SIZE, length2=CHAMFER1_PART_2_SIZE2, reference=chamfer1_part_2_side[0])

    # Chamfer2
    chamfer2_edges = [part.edges().sort_by_distance(p)[0] for p in [
        (0, 4.953, 0),
        (-104.000000026, 4.953, 0),
        (-104.000000026, 4.953, -101.6),
        (0, 4.953, -101.6),
    ]]
    chamfer(chamfer2_edges, length=CHAMFER2_SIZE)


solid = part.part
